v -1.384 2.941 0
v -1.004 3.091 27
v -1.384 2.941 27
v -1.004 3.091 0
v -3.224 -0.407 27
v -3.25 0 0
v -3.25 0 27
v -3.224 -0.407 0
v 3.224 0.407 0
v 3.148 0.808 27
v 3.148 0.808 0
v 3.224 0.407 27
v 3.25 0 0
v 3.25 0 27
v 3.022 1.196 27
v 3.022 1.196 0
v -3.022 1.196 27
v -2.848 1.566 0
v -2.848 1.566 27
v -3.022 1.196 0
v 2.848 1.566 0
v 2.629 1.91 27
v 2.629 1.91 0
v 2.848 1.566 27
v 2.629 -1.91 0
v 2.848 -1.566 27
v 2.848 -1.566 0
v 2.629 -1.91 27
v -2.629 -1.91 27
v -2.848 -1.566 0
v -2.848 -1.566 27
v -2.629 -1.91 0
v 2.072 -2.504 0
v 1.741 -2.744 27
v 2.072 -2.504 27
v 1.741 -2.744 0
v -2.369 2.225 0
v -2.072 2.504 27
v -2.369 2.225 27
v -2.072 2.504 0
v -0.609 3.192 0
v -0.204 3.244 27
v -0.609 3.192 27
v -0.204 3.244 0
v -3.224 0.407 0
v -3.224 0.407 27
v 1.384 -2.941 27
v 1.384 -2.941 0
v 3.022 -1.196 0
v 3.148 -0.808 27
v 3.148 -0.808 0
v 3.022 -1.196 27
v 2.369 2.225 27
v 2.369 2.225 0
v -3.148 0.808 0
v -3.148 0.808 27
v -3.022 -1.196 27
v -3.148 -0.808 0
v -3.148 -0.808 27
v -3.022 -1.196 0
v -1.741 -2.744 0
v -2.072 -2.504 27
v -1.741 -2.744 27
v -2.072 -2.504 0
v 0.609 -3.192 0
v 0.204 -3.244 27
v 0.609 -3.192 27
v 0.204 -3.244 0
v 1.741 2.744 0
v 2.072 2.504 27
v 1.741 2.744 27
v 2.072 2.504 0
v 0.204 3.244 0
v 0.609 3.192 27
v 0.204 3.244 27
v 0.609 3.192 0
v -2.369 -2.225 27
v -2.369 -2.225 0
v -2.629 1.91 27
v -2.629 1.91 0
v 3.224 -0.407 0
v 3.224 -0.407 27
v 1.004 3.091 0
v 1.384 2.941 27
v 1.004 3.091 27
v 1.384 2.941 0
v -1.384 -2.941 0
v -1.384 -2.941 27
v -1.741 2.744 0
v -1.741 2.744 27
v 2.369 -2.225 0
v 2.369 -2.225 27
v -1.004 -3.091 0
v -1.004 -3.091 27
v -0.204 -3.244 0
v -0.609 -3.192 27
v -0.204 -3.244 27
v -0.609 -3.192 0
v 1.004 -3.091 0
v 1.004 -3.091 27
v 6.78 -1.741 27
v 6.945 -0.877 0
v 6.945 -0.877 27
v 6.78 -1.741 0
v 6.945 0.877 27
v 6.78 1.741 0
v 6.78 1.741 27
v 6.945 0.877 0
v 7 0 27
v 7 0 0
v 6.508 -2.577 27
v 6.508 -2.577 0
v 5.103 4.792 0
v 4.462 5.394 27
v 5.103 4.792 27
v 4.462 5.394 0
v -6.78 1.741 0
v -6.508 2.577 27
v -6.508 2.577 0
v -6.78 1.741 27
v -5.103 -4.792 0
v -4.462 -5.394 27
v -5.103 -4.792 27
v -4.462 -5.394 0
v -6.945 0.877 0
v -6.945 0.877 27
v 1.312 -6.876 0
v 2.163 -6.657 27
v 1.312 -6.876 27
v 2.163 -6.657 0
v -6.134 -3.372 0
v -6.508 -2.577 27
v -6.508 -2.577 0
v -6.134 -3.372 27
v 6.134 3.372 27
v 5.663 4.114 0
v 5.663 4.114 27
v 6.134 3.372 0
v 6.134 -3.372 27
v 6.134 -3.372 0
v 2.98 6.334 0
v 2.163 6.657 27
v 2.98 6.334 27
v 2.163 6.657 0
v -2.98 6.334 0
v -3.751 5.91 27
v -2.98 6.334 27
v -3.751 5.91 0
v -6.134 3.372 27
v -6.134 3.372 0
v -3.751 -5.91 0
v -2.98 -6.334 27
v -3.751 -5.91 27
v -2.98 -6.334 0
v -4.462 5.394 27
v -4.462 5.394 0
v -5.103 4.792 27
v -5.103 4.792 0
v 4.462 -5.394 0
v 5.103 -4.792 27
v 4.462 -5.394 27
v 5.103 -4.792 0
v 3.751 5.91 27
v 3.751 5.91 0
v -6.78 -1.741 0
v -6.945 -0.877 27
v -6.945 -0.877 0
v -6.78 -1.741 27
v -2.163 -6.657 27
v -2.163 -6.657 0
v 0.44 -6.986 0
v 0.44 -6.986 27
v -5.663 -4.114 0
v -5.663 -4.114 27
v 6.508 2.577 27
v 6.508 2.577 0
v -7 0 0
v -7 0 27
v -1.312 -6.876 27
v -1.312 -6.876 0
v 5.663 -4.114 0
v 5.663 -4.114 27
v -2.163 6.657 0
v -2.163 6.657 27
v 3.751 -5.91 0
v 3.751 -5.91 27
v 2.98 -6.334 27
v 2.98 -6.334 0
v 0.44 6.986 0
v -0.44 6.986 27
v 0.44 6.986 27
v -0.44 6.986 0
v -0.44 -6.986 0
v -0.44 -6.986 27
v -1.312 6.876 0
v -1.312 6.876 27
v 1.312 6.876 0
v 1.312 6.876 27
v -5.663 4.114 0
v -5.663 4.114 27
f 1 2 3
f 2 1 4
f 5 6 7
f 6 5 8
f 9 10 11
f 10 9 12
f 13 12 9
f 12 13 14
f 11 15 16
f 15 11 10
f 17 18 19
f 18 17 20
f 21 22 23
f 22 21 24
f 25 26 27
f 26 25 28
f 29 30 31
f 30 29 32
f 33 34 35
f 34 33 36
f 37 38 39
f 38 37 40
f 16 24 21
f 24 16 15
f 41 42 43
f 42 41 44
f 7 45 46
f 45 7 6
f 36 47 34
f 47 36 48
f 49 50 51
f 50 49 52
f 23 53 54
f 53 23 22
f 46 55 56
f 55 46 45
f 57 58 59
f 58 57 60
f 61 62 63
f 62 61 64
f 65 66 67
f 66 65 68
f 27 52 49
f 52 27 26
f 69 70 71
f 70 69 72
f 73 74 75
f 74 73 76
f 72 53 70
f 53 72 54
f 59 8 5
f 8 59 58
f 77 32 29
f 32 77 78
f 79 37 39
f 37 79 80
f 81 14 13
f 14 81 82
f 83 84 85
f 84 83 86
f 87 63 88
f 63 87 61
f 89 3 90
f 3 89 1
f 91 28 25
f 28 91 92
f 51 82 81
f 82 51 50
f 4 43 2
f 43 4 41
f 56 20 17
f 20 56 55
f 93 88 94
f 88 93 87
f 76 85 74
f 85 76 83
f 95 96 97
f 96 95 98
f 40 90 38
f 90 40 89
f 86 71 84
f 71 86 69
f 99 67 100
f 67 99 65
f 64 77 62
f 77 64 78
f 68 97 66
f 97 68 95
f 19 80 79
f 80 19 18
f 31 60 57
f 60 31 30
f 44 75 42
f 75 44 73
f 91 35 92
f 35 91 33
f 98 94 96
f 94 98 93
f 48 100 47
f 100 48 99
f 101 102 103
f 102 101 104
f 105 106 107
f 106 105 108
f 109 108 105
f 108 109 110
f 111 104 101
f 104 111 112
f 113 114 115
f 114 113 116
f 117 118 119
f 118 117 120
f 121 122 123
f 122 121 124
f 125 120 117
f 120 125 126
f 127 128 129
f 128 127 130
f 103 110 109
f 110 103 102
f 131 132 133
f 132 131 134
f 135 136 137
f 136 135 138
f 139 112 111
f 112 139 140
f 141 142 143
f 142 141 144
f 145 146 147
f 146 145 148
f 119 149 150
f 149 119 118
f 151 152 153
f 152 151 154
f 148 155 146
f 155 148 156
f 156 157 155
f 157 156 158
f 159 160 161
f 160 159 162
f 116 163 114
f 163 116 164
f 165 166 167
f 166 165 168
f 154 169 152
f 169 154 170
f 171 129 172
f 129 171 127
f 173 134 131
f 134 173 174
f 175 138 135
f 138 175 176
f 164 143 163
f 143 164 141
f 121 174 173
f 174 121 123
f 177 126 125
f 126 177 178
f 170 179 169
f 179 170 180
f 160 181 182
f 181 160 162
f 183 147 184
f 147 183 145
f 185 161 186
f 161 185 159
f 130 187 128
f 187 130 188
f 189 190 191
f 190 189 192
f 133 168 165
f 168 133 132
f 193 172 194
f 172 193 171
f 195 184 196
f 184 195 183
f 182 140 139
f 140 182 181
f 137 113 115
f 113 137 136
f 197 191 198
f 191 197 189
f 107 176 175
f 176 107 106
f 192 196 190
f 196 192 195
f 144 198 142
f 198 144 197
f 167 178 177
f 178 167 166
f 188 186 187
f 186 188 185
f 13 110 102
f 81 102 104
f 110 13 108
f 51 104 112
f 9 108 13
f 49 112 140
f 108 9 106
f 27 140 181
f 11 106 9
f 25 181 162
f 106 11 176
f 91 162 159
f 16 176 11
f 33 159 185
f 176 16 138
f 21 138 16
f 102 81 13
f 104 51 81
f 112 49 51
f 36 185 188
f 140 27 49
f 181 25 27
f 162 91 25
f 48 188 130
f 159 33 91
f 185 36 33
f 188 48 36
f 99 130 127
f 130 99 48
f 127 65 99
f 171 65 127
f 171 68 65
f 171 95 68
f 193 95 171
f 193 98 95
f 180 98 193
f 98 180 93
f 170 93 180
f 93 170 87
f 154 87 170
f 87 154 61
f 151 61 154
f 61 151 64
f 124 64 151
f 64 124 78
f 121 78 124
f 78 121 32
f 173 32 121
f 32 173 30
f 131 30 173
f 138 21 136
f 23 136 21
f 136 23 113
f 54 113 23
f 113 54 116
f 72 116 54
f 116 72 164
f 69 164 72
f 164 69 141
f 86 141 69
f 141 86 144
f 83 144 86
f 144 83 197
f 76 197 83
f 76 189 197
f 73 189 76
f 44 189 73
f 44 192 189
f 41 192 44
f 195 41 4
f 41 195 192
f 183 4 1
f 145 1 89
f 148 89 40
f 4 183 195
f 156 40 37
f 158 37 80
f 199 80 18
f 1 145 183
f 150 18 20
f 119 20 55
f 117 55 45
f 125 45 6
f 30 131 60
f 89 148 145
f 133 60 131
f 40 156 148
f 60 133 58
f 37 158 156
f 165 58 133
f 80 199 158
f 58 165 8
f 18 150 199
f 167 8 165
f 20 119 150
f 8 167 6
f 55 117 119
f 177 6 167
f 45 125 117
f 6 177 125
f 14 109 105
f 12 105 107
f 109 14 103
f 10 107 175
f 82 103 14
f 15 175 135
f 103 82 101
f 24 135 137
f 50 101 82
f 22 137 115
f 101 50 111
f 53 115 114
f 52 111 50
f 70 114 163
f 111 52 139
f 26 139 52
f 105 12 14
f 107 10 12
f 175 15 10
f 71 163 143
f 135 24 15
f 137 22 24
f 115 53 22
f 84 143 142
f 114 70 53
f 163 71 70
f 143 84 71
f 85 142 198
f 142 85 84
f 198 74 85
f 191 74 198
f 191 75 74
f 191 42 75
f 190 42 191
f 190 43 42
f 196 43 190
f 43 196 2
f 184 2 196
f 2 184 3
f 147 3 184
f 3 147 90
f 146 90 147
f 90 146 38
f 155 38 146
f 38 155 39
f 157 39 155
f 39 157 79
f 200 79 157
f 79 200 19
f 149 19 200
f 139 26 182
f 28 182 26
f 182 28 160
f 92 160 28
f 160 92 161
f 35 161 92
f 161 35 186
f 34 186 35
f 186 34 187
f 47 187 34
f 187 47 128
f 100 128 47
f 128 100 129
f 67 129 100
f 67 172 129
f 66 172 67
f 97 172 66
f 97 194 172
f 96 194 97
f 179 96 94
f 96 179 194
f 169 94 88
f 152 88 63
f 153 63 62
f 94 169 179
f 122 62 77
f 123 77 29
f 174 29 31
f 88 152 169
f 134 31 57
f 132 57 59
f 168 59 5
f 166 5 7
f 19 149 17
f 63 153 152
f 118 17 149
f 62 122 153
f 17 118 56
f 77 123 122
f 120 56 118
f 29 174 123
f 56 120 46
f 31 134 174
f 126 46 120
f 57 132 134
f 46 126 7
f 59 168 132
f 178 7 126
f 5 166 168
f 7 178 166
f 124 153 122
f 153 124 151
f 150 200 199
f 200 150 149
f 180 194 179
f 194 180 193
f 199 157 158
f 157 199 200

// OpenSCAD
$fn = 50;


difference() {
	union() {
		*color(alpha = 1.0000000000, c = "gray") {
			translate(v = [0, 7, 0]) {
				linear_extrude(height = 1) {
					text(font = "Arial:style=Bold", halign = "center", size = 4.5000000000, text = "COMMENT plate main", valign = "center");
				}
			}
		}
		cylinder(h = 27, r = 7.0000000000);
	}
	union() {
		*color(alpha = 1.0000000000, c = "gray") {
			translate(v = [0, 7, 0]) {
				linear_extrude(height = 1) {
					text(font = "Arial:style=Bold", halign = "center", size = 4.5000000000, text = "COMMENT holes main", valign = "center");
				}
			}
		}
		translate(v = [0, 0, -100]) {
			cylinder(h = 200, r = 3.2500000000);
		}
		translate(v = [0, 0, -100]) {
			cylinder(h = 200, r = 1.8000000000);
		}
	}
}
